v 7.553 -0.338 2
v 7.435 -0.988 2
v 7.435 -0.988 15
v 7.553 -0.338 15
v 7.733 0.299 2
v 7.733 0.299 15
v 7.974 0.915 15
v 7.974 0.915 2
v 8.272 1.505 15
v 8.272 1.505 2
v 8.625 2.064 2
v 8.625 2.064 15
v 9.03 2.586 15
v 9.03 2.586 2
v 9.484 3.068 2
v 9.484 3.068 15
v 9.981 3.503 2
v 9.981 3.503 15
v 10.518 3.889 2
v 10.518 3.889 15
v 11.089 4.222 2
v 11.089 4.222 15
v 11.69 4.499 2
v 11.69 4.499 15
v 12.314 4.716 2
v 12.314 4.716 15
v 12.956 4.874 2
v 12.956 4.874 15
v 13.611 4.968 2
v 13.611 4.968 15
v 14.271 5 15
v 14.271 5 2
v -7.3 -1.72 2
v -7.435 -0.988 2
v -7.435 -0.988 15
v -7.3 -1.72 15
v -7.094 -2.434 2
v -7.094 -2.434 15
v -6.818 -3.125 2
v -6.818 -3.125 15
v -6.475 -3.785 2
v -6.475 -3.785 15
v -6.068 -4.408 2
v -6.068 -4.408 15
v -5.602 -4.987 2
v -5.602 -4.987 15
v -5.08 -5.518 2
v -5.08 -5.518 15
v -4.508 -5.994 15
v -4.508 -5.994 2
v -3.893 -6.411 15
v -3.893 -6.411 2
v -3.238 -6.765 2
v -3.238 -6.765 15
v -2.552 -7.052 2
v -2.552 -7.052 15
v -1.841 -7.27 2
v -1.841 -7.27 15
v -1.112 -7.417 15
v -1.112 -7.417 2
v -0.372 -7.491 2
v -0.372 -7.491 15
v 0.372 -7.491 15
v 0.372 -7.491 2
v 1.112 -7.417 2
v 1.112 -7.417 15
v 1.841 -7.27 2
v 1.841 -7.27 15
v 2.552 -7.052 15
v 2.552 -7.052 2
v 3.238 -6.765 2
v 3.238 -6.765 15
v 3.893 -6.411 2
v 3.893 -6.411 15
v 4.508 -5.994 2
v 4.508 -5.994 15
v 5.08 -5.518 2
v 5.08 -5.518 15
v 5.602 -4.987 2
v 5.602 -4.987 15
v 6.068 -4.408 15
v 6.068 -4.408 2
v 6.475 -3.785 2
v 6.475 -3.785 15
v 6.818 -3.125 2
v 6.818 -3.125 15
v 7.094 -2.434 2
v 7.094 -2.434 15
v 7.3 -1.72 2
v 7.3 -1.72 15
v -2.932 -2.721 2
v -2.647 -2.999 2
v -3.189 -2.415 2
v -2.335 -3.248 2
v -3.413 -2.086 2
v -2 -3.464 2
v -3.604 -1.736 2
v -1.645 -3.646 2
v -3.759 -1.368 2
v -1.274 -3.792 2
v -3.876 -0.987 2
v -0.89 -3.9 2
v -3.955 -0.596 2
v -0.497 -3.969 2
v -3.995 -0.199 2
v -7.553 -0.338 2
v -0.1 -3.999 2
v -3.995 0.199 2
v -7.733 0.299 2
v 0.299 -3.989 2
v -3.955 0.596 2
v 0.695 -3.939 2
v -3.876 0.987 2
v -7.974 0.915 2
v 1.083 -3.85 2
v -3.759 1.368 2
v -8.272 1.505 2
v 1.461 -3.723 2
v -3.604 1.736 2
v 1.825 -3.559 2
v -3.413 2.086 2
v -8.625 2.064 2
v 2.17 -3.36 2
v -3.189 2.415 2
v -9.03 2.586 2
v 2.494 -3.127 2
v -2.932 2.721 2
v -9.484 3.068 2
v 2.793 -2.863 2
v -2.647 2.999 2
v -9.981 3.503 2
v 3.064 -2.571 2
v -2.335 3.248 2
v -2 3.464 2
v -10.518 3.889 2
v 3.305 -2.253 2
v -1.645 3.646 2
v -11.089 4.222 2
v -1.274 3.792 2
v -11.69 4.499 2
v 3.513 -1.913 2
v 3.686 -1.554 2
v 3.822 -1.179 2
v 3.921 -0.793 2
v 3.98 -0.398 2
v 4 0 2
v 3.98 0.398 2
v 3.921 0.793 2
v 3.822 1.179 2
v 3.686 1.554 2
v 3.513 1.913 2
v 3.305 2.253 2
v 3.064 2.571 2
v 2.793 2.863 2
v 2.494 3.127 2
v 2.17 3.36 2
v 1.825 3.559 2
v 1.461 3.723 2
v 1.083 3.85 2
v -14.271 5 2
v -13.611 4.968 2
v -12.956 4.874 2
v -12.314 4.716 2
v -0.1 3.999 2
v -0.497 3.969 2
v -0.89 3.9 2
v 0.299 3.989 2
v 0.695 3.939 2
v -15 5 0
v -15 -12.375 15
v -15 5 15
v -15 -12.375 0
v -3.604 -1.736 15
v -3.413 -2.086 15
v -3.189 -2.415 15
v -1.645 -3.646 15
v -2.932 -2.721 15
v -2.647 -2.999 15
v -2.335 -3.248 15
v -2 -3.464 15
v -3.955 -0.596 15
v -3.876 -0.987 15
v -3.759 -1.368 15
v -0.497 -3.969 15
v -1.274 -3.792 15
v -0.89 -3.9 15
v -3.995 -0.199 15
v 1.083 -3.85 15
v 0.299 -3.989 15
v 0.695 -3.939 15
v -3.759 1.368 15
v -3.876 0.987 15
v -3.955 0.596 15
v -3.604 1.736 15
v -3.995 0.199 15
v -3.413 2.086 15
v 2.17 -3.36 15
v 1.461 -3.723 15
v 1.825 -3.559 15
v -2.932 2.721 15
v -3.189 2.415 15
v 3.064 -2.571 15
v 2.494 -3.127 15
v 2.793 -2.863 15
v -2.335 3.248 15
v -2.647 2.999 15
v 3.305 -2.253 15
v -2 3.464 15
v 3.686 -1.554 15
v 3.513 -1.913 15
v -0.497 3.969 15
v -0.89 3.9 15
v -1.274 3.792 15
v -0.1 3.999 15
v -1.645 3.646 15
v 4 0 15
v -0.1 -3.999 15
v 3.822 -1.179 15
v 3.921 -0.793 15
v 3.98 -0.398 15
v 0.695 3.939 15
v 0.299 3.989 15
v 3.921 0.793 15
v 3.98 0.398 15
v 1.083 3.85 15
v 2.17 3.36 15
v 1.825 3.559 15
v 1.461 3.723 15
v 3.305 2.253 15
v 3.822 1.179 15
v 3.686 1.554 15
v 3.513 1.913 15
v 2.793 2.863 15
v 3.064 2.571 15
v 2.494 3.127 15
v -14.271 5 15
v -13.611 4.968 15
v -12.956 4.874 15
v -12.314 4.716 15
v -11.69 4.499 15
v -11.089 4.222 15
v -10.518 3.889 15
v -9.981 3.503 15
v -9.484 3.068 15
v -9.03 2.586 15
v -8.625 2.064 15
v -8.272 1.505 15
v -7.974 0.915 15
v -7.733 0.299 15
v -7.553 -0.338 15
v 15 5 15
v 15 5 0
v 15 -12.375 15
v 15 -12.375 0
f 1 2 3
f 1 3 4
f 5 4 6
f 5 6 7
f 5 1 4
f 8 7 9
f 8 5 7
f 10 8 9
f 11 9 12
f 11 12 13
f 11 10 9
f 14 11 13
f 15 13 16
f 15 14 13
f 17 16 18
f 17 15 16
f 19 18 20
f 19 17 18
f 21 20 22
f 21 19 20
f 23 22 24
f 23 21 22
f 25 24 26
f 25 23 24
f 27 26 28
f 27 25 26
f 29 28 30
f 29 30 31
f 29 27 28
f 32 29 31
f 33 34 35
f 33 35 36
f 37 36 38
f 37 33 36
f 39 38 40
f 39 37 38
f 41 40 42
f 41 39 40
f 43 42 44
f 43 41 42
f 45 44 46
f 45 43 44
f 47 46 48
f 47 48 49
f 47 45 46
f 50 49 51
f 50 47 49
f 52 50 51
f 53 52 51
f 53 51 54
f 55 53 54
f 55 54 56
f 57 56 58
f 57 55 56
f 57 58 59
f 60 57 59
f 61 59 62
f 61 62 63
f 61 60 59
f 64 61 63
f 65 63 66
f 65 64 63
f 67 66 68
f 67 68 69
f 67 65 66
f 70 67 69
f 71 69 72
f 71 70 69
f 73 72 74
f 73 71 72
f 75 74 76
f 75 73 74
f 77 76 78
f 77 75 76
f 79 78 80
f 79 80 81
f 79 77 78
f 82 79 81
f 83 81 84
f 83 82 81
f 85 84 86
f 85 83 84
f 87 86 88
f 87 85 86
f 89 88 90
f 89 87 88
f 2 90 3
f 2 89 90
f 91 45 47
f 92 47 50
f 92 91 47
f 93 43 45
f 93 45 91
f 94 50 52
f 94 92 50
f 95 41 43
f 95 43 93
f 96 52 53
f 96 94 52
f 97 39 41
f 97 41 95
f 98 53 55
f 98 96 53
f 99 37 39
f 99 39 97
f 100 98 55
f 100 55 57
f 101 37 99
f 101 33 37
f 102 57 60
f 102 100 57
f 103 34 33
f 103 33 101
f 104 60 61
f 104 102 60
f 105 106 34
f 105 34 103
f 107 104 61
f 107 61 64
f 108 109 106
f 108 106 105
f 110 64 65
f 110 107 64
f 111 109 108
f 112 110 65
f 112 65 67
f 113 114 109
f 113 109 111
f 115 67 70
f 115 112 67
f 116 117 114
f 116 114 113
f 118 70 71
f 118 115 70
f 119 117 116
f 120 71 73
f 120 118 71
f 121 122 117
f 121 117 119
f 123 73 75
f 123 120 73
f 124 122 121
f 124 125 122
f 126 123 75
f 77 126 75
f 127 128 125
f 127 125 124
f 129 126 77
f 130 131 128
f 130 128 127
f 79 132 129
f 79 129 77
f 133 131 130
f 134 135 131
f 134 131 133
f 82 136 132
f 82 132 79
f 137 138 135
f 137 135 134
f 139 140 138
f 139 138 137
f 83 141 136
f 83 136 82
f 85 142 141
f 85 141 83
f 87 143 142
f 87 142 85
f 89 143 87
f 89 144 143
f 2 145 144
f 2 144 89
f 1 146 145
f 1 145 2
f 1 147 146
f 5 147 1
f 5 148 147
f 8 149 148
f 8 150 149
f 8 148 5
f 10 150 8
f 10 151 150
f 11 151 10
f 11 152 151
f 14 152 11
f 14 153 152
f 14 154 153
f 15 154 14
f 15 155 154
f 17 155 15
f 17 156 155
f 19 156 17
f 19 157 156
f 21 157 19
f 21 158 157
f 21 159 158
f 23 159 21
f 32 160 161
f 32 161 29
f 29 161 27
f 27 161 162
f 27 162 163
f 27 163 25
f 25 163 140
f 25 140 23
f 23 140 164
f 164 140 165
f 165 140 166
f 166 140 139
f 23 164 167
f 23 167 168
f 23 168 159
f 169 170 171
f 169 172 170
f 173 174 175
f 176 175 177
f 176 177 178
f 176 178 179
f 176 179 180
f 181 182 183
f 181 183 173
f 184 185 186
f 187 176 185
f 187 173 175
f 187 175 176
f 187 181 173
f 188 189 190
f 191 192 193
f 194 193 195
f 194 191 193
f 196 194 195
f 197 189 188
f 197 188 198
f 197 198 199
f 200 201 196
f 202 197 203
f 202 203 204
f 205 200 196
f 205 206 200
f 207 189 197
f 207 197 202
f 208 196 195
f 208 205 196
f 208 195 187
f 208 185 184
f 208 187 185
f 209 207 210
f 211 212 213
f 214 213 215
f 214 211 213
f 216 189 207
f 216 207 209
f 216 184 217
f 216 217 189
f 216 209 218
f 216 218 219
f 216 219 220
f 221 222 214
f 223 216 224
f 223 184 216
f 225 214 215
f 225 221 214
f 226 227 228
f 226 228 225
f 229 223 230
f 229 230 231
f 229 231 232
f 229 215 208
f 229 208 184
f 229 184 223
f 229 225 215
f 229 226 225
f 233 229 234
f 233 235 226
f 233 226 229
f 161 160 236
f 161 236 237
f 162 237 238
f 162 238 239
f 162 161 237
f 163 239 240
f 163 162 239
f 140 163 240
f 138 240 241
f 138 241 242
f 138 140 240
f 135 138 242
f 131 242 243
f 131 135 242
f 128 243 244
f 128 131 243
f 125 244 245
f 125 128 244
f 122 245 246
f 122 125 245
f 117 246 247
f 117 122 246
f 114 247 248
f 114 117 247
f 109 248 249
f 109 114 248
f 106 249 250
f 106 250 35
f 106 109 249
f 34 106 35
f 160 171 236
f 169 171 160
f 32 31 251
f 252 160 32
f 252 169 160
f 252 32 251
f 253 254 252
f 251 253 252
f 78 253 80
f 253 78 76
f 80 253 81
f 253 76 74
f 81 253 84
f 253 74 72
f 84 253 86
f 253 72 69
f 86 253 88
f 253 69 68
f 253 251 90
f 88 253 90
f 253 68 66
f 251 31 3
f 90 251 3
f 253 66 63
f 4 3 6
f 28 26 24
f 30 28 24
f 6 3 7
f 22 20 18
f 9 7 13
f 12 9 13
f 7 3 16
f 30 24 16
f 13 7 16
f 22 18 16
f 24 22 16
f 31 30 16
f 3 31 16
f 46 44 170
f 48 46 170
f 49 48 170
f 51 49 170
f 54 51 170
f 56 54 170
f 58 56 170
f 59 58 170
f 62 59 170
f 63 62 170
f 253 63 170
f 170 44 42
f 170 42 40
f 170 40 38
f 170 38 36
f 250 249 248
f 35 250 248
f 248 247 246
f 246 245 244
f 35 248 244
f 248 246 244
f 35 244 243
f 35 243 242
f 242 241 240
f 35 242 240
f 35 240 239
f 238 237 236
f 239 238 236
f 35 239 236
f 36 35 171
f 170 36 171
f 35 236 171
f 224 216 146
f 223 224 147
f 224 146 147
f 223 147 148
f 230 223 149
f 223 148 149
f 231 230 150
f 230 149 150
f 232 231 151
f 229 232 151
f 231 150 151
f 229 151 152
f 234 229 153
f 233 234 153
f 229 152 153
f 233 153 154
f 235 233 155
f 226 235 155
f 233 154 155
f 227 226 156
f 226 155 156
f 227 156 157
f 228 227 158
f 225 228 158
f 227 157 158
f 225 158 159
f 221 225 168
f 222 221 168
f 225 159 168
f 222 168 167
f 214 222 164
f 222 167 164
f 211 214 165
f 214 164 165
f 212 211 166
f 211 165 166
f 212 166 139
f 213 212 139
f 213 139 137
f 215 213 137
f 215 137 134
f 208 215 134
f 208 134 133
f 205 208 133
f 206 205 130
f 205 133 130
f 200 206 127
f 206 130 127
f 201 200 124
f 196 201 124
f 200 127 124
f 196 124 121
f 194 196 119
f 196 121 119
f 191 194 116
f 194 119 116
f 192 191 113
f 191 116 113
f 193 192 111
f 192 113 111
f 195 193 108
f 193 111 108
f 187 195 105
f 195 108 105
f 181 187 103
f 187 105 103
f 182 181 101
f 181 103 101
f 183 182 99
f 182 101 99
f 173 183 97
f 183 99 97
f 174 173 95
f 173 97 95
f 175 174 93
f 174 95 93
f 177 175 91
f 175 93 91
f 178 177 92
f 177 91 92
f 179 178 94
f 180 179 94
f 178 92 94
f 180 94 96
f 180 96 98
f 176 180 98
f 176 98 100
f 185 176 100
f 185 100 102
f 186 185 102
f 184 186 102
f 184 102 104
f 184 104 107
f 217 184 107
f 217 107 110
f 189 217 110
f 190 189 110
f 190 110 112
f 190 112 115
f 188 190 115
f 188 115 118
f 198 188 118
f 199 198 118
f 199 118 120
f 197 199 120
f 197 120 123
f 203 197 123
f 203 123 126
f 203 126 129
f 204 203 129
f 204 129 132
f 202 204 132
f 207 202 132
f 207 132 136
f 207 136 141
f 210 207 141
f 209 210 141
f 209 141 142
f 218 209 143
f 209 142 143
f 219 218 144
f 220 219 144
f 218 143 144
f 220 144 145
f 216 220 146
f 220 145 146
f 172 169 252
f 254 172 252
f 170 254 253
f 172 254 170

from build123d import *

# Parameters (mm, degrees)
CROQUIS2_W              = 30
CROQUIS2_H              = 17.375045376
SALIENTE_EXTRUIR1_DEPTH = 2
CROQUIS3_R              = 4
SALIENTE_EXTRUIR2_DEPTH = 13


with BuildPart() as part:
    # Croquis2 → Saliente-Extruir1 (new body)
    with BuildSketch(Plane.XY):
        with Locations((0, -3.687522688)):
            Rectangle(CROQUIS2_W, CROQUIS2_H)
    extrude(amount=SALIENTE_EXTRUIR1_DEPTH)

    # Croquis3 → Saliente-Extruir2 (add)
    with BuildSketch(Plane.XY.offset(2)):
        Circle(CROQUIS3_R)
        with BuildLine():
            Line((-15, 5), (-14.271293534, 5))
            ThreePointArc((-14.271293534, 5), (-9.727126272, 3.291298824), (-7.434621256, -0.98813298))
            ThreePointArc((-7.434621256, -0.98813298), (0, -7.5), (7.434621256, -0.98813298))
            ThreePointArc((7.434621256, -0.98813298), (9.727126272, 3.291298824), (14.271293534, 5))
            Line((14.271293534, 5), (15, 5))
            Line((15, 5), (15, -12.375045376))
            Line((15, -12.375045376), (-15, -12.375045376))
            Line((-15, -12.375045376), (-15, 5))
        make_face()
    extrude(amount=SALIENTE_EXTRUIR2_DEPTH)


solid = part.part
